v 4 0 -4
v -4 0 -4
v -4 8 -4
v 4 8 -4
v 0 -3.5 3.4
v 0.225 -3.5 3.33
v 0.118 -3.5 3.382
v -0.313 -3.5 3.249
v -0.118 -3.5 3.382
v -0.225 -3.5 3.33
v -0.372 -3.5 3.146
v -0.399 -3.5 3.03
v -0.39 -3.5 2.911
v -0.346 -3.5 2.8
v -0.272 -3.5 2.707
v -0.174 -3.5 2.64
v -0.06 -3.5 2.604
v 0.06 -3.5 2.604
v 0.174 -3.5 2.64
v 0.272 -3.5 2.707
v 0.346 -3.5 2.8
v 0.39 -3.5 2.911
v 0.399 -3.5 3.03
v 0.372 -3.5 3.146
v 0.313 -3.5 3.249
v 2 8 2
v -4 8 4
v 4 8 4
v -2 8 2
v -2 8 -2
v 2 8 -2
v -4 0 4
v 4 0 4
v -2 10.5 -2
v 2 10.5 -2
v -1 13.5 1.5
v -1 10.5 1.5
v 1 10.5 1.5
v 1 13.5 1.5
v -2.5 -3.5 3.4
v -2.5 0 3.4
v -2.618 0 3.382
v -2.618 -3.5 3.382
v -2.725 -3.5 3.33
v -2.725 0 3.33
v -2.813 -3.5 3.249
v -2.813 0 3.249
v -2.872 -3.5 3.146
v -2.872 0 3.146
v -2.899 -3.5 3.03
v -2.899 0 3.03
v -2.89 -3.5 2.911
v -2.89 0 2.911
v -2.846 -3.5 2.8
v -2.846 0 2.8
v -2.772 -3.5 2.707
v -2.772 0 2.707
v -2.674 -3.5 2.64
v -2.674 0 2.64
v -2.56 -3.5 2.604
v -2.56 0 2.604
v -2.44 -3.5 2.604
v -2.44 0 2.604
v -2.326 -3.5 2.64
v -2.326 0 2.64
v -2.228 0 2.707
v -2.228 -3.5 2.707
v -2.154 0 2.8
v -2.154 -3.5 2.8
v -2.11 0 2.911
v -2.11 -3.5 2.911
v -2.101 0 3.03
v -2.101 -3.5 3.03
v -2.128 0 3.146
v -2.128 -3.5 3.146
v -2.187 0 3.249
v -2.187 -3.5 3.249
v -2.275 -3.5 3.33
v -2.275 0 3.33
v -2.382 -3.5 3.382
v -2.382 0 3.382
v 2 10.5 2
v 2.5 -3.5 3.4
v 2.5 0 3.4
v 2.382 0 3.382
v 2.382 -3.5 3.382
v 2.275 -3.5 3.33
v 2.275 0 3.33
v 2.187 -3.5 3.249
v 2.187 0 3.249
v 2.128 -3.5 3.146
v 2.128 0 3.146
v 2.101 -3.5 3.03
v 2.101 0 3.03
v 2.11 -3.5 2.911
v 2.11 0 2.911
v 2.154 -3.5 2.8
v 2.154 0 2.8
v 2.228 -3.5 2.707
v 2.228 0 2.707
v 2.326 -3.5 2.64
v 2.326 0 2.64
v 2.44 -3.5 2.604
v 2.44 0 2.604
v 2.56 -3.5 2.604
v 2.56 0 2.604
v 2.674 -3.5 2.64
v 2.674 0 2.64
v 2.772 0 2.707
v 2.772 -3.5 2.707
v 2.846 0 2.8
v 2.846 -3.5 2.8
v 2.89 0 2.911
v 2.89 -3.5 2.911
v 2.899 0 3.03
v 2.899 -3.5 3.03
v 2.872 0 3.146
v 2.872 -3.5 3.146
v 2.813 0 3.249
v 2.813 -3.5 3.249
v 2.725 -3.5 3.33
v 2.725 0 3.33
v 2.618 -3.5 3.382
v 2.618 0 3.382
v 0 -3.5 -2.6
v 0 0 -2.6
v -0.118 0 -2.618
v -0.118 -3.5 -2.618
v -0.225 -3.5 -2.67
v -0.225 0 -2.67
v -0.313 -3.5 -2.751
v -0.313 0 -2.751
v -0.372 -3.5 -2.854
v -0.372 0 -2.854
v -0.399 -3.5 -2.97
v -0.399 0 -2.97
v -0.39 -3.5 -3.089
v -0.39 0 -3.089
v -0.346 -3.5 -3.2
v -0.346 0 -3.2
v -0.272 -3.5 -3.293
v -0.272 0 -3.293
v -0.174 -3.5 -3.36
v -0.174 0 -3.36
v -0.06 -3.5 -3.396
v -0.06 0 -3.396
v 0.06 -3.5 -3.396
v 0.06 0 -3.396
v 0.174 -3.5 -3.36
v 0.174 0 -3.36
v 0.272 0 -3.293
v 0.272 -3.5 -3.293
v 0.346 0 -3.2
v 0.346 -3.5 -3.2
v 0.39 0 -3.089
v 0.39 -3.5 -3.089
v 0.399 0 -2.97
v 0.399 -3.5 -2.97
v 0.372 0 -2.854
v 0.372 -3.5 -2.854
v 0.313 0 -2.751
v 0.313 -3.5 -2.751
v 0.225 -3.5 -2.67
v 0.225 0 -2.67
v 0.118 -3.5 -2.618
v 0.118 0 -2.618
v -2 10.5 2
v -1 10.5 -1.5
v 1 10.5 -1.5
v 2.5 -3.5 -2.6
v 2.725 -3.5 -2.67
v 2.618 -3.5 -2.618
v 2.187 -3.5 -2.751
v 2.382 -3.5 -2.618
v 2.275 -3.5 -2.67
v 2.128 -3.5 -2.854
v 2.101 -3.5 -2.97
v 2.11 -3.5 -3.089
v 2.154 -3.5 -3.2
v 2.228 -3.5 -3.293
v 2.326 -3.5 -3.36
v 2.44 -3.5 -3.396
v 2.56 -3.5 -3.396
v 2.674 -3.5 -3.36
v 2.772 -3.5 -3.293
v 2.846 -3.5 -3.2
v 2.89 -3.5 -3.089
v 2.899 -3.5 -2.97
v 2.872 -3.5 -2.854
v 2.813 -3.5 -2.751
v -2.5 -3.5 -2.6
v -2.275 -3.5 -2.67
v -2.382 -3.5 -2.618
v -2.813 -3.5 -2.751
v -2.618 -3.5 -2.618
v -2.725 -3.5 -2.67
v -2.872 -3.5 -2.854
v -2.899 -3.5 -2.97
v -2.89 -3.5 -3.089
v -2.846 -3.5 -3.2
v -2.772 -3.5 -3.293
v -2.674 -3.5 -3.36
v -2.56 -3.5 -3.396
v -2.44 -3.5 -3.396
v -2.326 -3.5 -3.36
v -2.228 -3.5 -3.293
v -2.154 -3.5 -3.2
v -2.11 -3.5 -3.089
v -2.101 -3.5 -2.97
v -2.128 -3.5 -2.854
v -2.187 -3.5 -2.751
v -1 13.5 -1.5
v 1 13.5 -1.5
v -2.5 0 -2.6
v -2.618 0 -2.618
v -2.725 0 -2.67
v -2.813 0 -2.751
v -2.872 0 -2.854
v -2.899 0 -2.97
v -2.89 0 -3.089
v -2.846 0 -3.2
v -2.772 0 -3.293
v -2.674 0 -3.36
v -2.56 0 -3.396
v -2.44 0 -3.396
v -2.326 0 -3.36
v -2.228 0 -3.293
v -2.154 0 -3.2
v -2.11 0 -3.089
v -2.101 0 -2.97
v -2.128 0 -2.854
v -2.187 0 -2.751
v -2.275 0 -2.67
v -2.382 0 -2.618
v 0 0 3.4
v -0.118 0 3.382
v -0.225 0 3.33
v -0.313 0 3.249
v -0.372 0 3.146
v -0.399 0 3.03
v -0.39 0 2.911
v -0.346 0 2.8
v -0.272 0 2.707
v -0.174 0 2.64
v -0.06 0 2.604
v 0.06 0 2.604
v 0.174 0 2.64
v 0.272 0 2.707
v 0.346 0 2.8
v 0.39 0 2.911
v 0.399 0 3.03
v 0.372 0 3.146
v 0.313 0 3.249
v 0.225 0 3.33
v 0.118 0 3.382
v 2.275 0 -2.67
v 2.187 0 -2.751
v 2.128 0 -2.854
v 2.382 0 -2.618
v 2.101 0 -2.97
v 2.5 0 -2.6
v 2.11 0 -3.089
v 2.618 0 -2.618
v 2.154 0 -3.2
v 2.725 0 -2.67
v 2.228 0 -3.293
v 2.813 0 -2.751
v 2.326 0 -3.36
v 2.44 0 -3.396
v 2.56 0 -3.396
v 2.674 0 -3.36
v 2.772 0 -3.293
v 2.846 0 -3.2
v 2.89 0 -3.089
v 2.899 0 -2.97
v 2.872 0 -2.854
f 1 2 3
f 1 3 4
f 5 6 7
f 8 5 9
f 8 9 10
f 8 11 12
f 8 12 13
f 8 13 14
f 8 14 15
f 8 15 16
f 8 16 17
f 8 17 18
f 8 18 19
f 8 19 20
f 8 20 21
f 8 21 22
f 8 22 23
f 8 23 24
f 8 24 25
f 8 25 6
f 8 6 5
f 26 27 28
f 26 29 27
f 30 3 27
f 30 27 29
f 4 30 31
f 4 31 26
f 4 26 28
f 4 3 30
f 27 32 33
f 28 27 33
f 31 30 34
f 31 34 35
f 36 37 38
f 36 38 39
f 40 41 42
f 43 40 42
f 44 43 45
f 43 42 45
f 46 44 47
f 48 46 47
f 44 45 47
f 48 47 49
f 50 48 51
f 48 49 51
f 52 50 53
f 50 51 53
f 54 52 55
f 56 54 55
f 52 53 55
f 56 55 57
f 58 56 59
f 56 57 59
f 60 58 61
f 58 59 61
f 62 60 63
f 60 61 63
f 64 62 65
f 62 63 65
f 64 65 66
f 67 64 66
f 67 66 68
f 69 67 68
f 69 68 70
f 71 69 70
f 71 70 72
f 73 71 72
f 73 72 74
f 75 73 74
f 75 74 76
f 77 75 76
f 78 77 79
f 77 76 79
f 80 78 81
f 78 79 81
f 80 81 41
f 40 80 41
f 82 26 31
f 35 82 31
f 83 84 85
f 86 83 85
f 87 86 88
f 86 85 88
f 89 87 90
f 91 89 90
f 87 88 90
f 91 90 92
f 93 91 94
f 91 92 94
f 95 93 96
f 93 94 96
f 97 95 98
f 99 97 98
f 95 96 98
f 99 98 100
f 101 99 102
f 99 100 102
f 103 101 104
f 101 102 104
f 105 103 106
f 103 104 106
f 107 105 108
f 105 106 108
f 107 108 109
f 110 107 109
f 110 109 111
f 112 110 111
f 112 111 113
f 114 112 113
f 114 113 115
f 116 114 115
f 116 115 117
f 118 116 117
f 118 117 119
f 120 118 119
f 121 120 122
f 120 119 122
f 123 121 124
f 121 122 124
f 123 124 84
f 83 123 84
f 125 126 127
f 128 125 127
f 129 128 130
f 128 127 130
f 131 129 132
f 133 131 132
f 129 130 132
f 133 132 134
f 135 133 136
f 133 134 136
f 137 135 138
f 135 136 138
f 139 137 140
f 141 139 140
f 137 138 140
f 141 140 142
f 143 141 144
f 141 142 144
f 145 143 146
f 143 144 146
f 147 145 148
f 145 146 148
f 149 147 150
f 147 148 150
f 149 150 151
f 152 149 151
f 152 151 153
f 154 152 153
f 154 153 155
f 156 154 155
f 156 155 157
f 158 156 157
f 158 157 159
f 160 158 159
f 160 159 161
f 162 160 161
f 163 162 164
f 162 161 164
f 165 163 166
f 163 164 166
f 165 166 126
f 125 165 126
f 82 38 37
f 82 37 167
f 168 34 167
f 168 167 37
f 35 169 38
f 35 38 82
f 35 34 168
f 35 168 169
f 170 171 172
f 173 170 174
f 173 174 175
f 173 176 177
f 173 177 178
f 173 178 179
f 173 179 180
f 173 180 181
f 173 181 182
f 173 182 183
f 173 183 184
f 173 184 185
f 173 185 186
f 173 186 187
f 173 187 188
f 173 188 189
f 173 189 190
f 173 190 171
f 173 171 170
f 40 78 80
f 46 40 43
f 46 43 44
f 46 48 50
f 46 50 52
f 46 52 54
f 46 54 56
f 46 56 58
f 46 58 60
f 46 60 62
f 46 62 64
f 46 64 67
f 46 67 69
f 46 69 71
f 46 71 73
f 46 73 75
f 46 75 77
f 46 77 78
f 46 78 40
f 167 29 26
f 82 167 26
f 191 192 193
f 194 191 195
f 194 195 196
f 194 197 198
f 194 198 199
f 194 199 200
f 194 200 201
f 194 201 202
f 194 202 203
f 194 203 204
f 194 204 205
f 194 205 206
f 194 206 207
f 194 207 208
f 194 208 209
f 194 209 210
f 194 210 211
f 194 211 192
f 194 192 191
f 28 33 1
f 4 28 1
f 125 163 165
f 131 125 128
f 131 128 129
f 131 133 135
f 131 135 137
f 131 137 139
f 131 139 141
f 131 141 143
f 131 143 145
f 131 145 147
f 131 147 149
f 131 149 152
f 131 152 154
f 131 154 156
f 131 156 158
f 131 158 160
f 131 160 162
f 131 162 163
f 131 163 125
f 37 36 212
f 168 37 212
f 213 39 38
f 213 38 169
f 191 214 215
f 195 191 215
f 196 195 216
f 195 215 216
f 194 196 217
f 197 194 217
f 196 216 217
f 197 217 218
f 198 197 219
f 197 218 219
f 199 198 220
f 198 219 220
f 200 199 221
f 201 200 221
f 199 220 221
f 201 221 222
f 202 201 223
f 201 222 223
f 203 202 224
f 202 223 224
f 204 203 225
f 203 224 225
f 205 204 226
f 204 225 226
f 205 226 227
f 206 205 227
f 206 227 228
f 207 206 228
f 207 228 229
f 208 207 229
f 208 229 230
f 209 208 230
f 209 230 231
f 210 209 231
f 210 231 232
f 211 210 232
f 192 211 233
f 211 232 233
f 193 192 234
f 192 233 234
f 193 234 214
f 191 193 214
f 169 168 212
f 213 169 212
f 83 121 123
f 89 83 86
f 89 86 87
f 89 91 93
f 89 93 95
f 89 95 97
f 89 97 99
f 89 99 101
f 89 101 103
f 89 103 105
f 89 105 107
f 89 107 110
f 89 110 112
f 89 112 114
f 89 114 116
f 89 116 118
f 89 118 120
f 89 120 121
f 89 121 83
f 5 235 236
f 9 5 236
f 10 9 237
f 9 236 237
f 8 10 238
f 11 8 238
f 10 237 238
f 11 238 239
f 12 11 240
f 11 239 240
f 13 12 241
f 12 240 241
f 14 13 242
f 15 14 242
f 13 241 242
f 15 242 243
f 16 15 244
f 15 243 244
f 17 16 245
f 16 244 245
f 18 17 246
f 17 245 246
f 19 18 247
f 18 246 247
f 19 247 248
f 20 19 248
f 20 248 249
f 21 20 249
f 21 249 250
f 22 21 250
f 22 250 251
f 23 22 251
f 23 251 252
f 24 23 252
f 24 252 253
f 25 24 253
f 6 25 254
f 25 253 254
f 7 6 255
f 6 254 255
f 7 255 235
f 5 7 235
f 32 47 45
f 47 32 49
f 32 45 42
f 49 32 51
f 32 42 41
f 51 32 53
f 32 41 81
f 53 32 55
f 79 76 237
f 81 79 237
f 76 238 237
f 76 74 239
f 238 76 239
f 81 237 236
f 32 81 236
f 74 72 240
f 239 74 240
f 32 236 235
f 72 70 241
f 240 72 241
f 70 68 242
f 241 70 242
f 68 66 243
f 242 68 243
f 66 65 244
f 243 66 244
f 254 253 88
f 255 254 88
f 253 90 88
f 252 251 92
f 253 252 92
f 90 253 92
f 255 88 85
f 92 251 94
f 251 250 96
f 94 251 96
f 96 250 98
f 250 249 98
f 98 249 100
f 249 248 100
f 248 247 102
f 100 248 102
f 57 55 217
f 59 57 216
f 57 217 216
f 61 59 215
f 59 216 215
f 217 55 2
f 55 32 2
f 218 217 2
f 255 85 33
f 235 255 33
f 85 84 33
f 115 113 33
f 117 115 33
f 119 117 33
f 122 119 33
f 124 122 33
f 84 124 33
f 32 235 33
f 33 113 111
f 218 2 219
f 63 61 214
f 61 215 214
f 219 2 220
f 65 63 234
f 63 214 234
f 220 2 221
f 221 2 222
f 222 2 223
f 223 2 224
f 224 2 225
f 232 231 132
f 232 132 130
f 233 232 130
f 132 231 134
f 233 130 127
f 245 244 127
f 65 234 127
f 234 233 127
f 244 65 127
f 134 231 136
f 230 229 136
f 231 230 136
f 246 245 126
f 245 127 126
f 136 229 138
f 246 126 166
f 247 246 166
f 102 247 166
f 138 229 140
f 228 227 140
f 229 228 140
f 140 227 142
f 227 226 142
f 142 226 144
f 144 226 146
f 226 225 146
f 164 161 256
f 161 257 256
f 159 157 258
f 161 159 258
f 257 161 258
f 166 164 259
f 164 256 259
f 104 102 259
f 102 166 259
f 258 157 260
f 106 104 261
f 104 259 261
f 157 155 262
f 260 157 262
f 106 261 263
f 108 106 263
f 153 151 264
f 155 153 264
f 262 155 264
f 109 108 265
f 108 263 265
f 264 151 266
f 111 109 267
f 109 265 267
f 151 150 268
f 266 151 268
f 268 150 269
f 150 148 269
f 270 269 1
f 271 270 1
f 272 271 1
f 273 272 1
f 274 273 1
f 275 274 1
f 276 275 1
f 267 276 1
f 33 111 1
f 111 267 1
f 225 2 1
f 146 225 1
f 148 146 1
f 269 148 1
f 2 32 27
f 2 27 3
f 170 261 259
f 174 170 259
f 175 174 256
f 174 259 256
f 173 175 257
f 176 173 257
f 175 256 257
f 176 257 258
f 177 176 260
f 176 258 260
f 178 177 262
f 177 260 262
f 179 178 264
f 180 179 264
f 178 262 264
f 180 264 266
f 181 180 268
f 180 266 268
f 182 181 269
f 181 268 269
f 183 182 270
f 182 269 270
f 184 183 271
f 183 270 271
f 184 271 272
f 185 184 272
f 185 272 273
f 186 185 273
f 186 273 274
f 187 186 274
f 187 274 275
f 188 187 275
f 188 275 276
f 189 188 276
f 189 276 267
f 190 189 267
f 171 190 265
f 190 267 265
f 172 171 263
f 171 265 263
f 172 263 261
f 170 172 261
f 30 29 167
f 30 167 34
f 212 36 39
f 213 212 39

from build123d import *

# Parameters (mm, degrees)
SKETCH1_W               = 8
SKETCH1_H               = 8
BOSS_EXTRUDE1_DEPTH     = 8
SKETCH2_W               = 4
SKETCH2_H               = 4
BOSS_EXTRUDE2_DEPTH     = 5.5
SKETCH3_R               = 0.4
BOSS_EXTRUDE3_DEPTH     = 3.5
SKETCH4_W               = 1
SKETCH4_H               = 4
CUT_EXTRUDE1_DEPTH      = 3
CUT_EXTRUDE2_DEPTH      = 15.637281168
CUT_EXTRUDE2_DEPTH_BACK = 15.637281168
SKETCH5_W               = 0.5
SKETCH5_H               = 3


with BuildPart() as part:
    # Sketch1 → Boss-Extrude1 (new body)
    with BuildSketch(Plane(origin=(0, 0, 0), x_dir=(1, 0, 0), z_dir=(0, 1, 0))):
        Rectangle(SKETCH1_W, SKETCH1_H)
    extrude(amount=BOSS_EXTRUDE1_DEPTH)

    # Sketch2 → Boss-Extrude2 (add)
    with BuildSketch(Plane(origin=(0, 8, 0), x_dir=(1, 0, 0), z_dir=(0, 1, 0))):
        Rectangle(SKETCH2_W, SKETCH2_H)
    extrude(amount=BOSS_EXTRUDE2_DEPTH)

    # Sketch3 → Boss-Extrude3 (add)
    with BuildSketch(Plane.XZ):
        with Locations(Location((0, 3, 0), (0, 0, 90))):
            Circle(SKETCH3_R)
        with Locations(Location((-2.5, 3, 0), (0, 0, 90))):
            Circle(SKETCH3_R)
        with Locations(Location((2.5, 3, 0), (0, 0, 90))):
            Circle(SKETCH3_R)
        with Locations(Location((2.5, -3, 0), (0, 0, 90))):
            Circle(SKETCH3_R)
        with Locations(Location((-2.5, -3, 0), (0, 0, 90))):
            Circle(SKETCH3_R)
        with Locations(Location((0, -3, 0), (0, 0, 90))):
            Circle(SKETCH3_R)
    extrude(amount=BOSS_EXTRUDE3_DEPTH)

    # Sketch4 → Cut-Extrude1 (cut)
    with BuildSketch(Plane(origin=(0, 13.5, 0), x_dir=(1, 0, 0), z_dir=(0, 1, 0))):
        with Locations((-1.5, 0)):
            Rectangle(SKETCH4_W, SKETCH4_H)
        with Locations((1.5, 0)):
            Rectangle(SKETCH4_W, SKETCH4_H)
    extrude(amount=-CUT_EXTRUDE1_DEPTH, mode=Mode.SUBTRACT)

    # Sketch5 → Cut-Extrude2 (cut, two sides: drawn at the far end of the back side and taken through both)
    with BuildSketch(Plane(origin=(0, 0, 0), x_dir=(0, 0, -1), z_dir=(1, 0, 0)).offset(-CUT_EXTRUDE2_DEPTH_BACK)):
        with Locations((-1.75, 12)):
            Rectangle(SKETCH5_W, SKETCH5_H)
        with Locations((1.75, 12)):
            Rectangle(SKETCH5_W, SKETCH5_H)
    extrude(amount=CUT_EXTRUDE2_DEPTH + CUT_EXTRUDE2_DEPTH_BACK, mode=Mode.SUBTRACT)


solid = part.part
